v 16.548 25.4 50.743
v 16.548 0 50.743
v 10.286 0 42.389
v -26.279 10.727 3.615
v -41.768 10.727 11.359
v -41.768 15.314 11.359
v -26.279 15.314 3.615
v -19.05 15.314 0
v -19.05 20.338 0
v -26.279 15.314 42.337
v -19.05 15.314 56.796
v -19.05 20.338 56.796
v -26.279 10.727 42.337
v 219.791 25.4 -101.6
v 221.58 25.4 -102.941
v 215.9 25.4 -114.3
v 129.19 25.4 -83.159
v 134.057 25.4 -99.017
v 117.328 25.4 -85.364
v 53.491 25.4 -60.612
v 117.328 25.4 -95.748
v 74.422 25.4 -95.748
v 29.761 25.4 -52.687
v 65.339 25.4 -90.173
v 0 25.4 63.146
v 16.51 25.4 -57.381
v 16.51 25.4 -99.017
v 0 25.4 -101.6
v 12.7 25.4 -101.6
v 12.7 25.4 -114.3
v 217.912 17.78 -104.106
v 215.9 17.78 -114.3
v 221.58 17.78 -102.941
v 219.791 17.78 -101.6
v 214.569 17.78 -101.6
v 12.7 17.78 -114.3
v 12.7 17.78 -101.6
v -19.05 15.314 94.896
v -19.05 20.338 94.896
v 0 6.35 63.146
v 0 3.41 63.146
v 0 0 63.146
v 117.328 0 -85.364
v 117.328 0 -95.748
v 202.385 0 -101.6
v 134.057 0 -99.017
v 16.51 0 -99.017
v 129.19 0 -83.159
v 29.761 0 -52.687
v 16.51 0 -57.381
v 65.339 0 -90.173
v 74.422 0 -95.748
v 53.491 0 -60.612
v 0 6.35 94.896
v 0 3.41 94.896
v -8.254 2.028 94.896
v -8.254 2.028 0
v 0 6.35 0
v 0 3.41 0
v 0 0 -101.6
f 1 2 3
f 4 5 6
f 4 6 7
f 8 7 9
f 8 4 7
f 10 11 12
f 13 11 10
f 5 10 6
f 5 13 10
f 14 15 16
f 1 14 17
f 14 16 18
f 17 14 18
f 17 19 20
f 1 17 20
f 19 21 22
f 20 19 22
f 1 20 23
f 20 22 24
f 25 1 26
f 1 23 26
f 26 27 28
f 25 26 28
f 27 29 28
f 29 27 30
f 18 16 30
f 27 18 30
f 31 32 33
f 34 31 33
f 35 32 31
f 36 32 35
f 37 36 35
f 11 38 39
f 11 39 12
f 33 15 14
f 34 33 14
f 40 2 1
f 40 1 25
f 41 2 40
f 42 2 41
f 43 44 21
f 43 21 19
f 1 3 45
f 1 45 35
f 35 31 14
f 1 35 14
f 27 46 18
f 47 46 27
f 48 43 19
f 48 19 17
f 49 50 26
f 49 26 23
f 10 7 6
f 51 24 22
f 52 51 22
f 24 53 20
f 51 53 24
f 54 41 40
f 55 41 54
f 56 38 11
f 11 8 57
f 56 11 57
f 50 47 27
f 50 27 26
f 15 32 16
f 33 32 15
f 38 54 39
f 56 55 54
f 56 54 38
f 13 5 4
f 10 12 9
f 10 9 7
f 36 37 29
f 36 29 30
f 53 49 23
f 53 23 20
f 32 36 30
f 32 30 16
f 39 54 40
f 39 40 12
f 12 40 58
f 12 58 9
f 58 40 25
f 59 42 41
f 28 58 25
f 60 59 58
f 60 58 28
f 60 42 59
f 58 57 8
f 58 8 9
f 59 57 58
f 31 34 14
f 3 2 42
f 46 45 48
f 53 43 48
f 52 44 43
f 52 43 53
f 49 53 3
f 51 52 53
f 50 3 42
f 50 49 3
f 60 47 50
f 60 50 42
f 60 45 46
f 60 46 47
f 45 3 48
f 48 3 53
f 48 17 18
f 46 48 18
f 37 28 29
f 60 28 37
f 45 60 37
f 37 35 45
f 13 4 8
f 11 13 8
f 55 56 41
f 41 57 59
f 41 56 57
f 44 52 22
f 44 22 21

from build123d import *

# Parameters (mm, degrees)
BOSS_EXTRUDE1_DEPTH = 25.4
SKETCH2_W           = 12.7
SKETCH2_H           = 17.78
CUT_EXTRUDE1_DEPTH  = 209.879612663
CUT_EXTRUDE2_DEPTH  = 95.896126628
CUT_EXTRUDE3_DEPTH  = 254


with BuildPart() as part:
    # Sketch1 → Boss-Extrude1 (new body)
    with BuildSketch(Plane(origin=(0, 0, 0), x_dir=(1, 0, 0), z_dir=(0, 1, 0))):
        Polygon((0, 0), (0, 101.6), (12.7, 101.6), (12.7, 114.3), (215.9, 114.3), (221.579612663, 102.940774674), (0, -63.146126628), (0, -94.896126628), (-19.05, -94.896126628), (-19.05, -56.796126628), (-41.768450651, -11.359225326), (-19.05, 0), align=None)
        Polygon((16.51, 99.016534905), (16.51, 57.380699548), (29.761390928, 52.687033829), (53.490710304, 60.611873008), (65.339387315, 90.173417518), (74.422473615, 95.748477248), (117.328122685, 95.748477248), (117.328122685, 85.363664607), (129.190216348, 83.158940906), (134.056716313, 99.016534905), align=None, mode=Mode.SUBTRACT)
    extrude(amount=BOSS_EXTRUDE1_DEPTH)

    # Sketch2 → Cut-Extrude1 (cut, through all)
    with BuildSketch(Plane.ZY.offset(-12.7)):
        with Locations((-107.95, 8.89)):
            Rectangle(SKETCH2_W, SKETCH2_H)
    extrude(amount=-CUT_EXTRUDE1_DEPTH, mode=Mode.SUBTRACT)

    # Sketch3 → Cut-Extrude2 (cut, through all)
    with BuildSketch(Plane(origin=(0, 0, 0), x_dir=(-1, 0, 0), z_dir=(0, 0, -1))):
        Polygon((26.279490994, 10.727129804), (19.05, 15.314148044), (19.05, 0), (41.768450651, 0), (41.768450651, 10.727129804), align=None)
        Polygon((8.25422712, 2.027835054), (0, 3.409743564), (0, 0), (19.05, 0), (19.05, 15.314148044), align=None)
        Polygon((19.05, 25.4), (0, 25.4), (0, 6.35), (19.05, 20.338025164), align=None)
        Polygon((41.768450651, 25.4), (19.05, 25.4), (19.05, 20.338025164), (26.279490994, 15.314148044), (41.768450651, 15.314148044), align=None)
    extrude(amount=-CUT_EXTRUDE2_DEPTH, mode=Mode.SUBTRACT)

    # Sketch4 → Cut-Extrude3 (cut)
    with BuildSketch(Plane(origin=(189.48572038, 0, -142.030648763), x_dir=(0, 1, 0), z_dir=(0.800169507, 0, -0.599773925))):
        Polygon((0, 40.087892142), (25.4, 50.527604994), (0, 50.527604994), align=None)
    extrude(amount=-CUT_EXTRUDE3_DEPTH, mode=Mode.SUBTRACT)


solid = part.part
